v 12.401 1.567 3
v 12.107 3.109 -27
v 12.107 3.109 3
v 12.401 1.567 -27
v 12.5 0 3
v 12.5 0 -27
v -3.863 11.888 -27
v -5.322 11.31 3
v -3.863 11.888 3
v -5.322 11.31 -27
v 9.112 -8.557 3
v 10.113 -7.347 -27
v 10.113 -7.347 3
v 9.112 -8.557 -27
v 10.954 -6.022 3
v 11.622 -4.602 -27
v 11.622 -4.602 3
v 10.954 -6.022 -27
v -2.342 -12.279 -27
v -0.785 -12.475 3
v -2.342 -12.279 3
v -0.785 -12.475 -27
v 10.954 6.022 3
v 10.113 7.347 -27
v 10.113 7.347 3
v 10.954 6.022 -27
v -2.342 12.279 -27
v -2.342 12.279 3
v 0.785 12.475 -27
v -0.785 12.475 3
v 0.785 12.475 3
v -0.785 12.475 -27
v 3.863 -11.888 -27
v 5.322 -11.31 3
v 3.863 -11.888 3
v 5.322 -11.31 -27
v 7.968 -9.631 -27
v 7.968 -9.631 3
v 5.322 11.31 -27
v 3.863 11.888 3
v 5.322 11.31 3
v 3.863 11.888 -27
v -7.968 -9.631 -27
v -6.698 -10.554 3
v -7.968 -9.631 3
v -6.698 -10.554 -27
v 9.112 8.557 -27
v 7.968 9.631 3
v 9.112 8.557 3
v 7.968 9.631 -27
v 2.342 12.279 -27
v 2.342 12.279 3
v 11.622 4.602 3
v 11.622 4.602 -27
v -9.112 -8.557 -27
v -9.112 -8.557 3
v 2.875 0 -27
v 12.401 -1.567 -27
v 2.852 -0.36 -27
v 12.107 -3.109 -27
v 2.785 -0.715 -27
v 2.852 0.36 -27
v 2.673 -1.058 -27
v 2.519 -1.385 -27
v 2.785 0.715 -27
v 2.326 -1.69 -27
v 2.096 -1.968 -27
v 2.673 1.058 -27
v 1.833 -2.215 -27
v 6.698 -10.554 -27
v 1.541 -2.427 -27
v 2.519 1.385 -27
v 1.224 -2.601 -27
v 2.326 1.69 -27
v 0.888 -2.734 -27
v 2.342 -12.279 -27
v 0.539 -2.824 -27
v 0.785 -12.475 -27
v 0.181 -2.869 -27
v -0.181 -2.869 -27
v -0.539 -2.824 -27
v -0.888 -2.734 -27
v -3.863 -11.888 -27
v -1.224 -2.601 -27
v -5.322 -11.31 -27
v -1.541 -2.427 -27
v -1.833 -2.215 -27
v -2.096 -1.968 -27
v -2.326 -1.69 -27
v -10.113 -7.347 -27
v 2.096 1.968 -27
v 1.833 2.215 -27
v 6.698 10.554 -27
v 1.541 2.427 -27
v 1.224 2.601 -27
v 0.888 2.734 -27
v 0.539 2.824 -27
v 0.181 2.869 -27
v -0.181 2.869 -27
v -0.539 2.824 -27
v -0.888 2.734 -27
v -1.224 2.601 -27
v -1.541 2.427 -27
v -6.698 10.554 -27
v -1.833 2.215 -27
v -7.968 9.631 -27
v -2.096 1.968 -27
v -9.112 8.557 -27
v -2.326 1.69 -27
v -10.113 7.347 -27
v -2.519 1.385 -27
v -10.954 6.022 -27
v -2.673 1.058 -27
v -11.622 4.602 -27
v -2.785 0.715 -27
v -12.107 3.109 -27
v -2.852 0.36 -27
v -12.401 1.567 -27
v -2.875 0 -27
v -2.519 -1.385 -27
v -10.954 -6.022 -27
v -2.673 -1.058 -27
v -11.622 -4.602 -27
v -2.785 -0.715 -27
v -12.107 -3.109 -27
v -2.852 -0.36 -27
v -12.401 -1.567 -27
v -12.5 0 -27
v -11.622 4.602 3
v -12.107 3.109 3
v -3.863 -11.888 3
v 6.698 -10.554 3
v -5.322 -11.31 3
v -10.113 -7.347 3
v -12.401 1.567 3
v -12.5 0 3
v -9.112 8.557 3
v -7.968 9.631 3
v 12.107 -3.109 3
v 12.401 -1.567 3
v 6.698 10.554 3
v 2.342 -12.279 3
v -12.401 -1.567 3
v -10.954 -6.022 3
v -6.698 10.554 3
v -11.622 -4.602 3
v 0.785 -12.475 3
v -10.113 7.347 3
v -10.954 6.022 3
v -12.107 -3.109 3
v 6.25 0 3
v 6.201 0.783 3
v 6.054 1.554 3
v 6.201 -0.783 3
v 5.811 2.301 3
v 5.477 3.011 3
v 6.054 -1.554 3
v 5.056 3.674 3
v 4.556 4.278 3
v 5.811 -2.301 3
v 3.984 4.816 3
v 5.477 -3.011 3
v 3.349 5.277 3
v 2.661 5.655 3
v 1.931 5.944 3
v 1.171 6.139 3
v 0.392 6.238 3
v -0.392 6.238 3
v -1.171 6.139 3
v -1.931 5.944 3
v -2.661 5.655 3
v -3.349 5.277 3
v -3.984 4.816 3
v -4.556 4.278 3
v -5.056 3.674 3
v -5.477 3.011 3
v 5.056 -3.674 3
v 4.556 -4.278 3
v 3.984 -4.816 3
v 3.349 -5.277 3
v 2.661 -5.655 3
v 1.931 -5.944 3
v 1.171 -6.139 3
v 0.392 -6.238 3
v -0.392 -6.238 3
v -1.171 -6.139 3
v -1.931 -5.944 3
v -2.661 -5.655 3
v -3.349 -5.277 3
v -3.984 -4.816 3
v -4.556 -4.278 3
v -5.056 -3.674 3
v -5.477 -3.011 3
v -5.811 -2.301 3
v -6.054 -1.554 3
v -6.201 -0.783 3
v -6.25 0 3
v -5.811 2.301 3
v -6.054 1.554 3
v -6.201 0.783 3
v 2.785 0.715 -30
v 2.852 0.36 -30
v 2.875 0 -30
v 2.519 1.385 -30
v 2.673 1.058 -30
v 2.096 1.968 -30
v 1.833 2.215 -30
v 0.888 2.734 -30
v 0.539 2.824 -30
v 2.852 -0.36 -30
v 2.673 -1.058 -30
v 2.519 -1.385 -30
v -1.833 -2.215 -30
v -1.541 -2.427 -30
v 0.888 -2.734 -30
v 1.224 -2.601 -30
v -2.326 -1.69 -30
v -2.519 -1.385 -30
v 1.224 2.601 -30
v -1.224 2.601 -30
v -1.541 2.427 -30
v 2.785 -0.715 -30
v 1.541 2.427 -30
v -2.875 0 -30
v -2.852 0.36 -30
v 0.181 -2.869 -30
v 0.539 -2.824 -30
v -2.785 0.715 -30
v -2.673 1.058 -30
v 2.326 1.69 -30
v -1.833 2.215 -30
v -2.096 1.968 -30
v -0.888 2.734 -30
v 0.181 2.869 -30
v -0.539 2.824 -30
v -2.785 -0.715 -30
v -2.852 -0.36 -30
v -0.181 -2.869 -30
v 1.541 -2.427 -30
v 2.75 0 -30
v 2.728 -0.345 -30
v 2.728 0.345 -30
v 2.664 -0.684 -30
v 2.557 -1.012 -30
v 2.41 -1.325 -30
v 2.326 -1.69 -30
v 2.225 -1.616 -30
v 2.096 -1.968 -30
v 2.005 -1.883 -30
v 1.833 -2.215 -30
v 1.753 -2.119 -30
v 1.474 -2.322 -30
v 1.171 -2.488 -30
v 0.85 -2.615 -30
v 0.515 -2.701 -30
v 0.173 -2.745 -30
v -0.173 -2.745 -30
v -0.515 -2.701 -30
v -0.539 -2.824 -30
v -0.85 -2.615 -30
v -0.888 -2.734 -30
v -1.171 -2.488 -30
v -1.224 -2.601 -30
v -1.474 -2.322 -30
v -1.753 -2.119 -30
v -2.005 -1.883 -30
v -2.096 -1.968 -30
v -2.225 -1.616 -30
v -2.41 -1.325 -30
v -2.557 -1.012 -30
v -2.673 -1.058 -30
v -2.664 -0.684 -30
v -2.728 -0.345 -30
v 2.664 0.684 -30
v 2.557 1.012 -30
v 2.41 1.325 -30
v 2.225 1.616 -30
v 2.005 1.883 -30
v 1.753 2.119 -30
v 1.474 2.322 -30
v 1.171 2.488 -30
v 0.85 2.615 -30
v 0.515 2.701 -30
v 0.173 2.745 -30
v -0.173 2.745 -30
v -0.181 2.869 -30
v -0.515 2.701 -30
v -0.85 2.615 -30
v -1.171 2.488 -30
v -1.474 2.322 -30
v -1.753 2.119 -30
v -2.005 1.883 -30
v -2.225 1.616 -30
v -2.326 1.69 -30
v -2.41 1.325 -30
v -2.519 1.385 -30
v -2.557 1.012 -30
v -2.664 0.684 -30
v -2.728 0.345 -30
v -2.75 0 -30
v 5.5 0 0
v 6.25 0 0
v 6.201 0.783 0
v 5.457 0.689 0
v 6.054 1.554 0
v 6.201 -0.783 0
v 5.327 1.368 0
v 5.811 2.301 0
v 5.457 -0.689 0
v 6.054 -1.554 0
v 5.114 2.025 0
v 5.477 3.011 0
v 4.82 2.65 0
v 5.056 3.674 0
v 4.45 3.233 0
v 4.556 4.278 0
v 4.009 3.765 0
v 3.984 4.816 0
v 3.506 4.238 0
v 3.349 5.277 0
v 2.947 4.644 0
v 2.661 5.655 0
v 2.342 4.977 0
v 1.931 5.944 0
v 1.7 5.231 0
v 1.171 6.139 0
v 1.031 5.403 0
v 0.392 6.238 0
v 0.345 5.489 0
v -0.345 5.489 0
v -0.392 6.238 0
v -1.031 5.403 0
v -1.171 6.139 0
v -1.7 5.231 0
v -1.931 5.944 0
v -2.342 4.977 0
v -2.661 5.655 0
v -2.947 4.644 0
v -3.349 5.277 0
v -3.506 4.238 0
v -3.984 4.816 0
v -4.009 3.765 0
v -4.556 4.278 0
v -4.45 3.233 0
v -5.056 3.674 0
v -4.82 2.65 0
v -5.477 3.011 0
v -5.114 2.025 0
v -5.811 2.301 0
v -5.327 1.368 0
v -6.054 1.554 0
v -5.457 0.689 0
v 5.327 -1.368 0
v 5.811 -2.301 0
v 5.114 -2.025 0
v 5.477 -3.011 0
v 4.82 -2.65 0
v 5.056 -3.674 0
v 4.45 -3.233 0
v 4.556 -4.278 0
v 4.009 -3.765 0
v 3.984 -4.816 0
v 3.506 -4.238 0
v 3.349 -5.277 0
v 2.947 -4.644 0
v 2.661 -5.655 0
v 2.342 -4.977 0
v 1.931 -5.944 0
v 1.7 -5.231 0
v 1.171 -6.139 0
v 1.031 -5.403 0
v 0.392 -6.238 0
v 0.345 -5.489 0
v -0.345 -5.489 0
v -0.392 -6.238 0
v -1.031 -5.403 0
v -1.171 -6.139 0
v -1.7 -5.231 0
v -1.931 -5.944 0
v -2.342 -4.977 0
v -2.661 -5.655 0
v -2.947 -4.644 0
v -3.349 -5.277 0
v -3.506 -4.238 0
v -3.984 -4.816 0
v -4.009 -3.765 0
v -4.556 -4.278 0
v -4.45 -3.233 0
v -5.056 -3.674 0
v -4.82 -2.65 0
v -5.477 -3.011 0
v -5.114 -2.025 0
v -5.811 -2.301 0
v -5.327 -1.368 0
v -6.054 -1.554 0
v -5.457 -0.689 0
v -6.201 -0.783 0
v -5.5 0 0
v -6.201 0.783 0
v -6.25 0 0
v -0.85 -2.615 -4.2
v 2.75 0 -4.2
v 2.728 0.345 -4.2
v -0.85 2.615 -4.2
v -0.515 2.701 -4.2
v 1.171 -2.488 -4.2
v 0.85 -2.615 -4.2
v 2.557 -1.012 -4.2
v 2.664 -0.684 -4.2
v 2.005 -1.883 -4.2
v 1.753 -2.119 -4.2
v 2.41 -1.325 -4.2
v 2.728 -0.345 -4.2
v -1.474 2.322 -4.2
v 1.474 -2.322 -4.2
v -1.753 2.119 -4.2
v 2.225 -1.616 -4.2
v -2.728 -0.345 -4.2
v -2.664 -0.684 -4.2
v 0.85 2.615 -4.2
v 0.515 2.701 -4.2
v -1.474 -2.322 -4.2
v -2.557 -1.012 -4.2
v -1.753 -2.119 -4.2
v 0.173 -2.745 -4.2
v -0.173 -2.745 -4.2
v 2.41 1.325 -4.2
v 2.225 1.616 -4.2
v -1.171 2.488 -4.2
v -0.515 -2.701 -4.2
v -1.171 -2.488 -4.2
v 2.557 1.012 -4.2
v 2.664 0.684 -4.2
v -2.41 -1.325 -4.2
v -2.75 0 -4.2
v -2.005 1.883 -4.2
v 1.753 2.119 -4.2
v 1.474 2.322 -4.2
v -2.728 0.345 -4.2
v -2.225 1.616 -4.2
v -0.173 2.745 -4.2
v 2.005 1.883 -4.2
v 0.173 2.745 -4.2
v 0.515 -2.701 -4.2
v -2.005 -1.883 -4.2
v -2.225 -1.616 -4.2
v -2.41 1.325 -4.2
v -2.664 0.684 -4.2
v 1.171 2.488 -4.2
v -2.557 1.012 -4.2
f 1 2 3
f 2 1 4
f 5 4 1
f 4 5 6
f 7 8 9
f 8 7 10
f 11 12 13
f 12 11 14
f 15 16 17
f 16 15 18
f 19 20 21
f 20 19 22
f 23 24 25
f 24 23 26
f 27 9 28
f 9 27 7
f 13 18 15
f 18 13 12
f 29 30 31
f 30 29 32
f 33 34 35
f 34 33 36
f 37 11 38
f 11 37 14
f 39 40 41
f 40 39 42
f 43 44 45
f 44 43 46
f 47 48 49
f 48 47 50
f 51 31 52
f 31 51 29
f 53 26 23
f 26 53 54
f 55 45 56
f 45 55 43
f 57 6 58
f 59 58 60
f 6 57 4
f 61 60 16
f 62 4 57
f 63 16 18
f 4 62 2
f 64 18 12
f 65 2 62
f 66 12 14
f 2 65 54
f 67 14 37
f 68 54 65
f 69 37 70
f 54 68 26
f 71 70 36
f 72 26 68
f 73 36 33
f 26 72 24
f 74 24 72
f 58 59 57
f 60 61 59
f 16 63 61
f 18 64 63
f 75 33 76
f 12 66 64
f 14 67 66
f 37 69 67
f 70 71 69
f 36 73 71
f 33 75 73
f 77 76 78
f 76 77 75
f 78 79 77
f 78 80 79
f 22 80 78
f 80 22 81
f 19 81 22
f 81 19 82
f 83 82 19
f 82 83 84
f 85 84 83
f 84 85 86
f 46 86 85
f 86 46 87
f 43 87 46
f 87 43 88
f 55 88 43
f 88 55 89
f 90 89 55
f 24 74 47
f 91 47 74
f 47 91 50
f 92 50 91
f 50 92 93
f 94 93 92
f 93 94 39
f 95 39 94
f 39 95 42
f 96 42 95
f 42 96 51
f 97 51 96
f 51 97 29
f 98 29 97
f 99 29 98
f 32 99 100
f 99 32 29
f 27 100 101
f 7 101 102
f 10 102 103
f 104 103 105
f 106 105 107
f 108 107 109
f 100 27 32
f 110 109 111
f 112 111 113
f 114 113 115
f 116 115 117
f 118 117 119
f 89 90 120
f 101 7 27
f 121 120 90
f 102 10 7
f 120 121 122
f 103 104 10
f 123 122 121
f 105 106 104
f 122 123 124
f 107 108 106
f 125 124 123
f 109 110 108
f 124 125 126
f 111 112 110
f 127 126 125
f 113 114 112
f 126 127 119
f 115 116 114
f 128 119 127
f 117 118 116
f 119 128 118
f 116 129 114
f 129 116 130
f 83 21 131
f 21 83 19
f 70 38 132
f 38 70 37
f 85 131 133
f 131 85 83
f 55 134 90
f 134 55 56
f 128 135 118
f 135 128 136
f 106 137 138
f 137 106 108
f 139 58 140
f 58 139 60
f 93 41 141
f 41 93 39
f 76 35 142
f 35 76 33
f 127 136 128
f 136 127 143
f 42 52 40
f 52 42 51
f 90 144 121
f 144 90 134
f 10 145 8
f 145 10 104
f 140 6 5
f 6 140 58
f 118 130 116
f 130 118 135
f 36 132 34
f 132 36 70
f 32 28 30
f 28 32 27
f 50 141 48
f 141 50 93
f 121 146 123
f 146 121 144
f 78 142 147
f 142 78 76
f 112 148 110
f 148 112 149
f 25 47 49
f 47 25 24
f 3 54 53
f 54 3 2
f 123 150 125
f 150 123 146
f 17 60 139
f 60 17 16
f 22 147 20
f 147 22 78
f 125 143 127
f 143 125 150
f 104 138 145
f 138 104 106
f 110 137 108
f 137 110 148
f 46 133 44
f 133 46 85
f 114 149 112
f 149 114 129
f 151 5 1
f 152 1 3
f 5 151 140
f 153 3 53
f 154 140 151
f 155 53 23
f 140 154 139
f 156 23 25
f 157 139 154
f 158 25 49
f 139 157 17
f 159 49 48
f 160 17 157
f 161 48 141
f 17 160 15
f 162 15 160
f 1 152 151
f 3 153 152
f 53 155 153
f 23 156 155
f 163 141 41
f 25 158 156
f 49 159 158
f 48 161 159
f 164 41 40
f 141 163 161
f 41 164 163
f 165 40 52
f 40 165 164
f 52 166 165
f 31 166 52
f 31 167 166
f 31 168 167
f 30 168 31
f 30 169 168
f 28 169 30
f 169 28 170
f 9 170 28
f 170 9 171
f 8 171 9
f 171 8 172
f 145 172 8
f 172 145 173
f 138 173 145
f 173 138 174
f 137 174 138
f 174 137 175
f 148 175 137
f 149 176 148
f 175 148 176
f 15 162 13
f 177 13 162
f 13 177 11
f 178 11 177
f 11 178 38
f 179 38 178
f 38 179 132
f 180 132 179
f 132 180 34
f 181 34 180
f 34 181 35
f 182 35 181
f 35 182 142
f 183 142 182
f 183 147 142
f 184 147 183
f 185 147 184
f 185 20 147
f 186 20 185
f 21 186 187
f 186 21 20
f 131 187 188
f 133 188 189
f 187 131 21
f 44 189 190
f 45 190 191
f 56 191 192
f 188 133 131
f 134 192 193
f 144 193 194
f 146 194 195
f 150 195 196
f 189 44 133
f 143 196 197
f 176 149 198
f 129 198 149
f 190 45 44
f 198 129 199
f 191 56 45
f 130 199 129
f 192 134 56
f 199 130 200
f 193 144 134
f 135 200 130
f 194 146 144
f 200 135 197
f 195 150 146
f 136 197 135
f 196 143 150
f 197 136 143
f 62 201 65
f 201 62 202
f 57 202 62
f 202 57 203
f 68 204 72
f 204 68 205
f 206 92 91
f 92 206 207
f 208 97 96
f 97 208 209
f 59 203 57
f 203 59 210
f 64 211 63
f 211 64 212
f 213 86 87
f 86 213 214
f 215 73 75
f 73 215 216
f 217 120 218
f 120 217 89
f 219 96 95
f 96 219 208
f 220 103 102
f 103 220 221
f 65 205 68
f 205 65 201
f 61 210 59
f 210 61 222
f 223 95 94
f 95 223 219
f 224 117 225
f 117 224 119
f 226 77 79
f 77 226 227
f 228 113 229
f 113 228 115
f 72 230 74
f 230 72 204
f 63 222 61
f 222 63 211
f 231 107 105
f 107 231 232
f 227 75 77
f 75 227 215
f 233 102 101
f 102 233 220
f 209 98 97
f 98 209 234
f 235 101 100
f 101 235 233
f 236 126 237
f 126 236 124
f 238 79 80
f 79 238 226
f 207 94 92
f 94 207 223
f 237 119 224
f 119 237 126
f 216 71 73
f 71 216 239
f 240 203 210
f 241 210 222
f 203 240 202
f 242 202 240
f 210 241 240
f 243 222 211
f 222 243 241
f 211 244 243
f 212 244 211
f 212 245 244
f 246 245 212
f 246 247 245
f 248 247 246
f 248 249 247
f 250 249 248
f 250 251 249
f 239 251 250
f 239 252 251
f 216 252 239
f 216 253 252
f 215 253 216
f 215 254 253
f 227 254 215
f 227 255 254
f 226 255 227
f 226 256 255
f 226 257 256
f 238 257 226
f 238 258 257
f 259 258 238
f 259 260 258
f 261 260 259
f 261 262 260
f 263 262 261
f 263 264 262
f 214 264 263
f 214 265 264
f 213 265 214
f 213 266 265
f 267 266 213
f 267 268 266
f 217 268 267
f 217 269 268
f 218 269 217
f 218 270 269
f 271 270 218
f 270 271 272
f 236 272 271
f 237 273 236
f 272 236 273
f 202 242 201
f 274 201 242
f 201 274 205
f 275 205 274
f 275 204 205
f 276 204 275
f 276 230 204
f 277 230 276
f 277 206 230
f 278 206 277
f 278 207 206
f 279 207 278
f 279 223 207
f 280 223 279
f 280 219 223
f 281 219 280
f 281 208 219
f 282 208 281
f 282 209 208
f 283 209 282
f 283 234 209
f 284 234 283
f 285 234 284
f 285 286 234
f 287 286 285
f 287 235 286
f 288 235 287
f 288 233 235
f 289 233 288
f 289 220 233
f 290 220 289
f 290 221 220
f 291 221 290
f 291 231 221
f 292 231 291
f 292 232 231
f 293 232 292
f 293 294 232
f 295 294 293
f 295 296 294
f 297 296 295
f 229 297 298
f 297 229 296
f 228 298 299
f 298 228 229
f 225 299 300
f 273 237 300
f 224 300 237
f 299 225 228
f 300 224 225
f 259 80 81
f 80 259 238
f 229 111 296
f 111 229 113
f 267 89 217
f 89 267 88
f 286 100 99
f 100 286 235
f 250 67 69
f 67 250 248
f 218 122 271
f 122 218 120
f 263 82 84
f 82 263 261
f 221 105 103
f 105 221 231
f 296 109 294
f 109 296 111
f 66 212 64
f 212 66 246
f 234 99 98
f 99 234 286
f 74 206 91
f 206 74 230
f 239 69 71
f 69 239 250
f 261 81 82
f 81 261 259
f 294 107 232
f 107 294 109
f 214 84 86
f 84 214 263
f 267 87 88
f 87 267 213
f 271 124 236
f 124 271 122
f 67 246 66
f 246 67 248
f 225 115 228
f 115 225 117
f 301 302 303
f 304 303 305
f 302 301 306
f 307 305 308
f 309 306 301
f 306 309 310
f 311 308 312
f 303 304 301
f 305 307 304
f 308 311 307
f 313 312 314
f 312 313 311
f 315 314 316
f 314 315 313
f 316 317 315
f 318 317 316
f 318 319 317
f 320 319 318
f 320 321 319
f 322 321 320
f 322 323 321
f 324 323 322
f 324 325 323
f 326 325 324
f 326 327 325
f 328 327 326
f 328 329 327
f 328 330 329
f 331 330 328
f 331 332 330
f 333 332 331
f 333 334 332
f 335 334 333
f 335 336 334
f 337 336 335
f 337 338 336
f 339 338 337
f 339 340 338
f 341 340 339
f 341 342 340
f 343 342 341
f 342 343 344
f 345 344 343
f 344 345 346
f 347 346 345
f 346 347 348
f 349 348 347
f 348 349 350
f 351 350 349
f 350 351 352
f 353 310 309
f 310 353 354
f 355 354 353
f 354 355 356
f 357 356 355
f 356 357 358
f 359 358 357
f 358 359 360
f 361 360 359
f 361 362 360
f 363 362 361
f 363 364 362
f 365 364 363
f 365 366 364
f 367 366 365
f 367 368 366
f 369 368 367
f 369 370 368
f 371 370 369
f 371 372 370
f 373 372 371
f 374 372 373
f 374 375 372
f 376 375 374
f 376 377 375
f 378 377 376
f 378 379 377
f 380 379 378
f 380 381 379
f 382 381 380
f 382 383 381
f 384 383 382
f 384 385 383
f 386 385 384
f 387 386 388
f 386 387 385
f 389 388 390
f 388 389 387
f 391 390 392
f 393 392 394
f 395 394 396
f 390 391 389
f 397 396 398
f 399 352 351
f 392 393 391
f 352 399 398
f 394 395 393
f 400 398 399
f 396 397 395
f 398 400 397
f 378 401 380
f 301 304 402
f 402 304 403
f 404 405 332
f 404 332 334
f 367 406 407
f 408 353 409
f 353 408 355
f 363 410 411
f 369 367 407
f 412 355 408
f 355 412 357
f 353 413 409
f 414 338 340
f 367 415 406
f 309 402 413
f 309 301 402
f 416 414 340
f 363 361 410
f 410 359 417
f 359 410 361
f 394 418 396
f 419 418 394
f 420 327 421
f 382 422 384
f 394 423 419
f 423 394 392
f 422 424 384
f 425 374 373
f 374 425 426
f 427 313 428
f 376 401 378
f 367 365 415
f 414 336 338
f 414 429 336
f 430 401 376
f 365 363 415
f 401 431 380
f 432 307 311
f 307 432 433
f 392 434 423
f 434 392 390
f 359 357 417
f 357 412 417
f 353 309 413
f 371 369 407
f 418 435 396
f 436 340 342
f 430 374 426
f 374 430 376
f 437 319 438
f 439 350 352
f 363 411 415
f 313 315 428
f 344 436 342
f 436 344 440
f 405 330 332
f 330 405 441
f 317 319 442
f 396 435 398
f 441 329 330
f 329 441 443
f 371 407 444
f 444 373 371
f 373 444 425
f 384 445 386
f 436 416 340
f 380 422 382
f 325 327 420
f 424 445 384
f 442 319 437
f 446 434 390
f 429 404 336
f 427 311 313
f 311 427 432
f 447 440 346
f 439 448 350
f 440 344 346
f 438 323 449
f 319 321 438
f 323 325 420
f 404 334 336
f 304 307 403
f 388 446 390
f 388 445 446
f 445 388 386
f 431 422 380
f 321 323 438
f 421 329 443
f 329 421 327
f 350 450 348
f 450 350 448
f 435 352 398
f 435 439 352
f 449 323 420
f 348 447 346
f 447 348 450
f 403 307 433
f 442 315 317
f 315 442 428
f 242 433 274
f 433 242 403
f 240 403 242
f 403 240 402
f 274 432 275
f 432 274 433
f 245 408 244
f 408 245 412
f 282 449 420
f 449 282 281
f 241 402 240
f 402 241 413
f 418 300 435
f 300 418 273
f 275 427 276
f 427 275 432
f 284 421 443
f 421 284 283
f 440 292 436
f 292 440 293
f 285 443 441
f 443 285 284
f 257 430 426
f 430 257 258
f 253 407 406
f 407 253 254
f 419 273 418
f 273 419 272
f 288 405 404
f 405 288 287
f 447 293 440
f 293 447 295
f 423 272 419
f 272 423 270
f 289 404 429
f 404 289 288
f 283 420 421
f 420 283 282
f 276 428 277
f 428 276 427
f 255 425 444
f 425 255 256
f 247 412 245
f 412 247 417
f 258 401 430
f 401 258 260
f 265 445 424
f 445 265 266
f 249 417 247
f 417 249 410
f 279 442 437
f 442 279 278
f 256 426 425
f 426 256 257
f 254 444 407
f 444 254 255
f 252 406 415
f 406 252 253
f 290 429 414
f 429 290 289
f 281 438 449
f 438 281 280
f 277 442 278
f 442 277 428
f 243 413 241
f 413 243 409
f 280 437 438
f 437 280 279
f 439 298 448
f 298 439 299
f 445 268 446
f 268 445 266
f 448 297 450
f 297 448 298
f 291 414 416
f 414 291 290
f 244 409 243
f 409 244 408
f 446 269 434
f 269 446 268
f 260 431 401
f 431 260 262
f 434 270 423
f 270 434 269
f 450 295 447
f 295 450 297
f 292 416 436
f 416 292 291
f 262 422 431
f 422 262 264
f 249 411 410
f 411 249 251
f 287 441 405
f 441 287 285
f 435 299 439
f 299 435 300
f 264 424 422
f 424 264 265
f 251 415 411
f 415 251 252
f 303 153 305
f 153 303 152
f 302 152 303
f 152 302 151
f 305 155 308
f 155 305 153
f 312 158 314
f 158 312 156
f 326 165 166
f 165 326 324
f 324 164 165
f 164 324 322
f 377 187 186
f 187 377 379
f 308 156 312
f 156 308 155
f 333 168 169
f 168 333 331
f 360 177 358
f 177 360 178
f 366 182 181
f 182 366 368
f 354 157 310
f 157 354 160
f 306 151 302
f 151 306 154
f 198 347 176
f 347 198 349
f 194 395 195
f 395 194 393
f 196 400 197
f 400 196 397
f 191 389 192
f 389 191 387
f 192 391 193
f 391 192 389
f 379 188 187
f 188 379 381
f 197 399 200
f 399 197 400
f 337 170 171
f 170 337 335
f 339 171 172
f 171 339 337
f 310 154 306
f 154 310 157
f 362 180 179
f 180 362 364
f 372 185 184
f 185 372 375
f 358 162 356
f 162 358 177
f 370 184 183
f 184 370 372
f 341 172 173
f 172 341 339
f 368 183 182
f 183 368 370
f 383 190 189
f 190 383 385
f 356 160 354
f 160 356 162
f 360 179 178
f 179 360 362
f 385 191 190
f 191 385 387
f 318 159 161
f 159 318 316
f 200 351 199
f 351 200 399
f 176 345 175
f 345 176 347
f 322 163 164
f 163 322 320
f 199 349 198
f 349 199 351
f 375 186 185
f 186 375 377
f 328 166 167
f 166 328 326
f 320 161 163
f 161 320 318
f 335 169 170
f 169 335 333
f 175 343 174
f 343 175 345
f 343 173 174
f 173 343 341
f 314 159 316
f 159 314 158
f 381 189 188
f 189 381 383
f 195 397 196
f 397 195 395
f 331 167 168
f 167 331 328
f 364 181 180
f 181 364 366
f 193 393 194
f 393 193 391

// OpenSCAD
$fn = 50;

difference() {
	union() {
		translate(v = [0, 0, -27.0]) {
			cylinder(h = 30, r = 12.5);
		}
		#translate(v = [0, 0, -30.0]) {
			cylinder(h = 30, r = 2.875);
		}
	}
	union() {
		translate(v = [0, 0, 0]) {
			rotate(a = [0, 0, 0]) {
				difference() {
					union() {
						translate(v = [0, 0, -30.0]) {
							cylinder(h = 30, r = 2.25);
						}
						translate(v = [0, 0, -4.2]) {
							cylinder(h = 4.2, r1 = 2.75, r2 = 5.5);
						}
						translate(v = [0, 0, -30.0]) {
							cylinder(h = 30, r = 2.75);
						}
						translate(v = [0, 0, -30.0]) {
							cylinder(h = 30, r = 2.25);
						}
					}
					union();
				}
			}
		}
		#cylinder(h = 3, r = 6.25);
	}
}
